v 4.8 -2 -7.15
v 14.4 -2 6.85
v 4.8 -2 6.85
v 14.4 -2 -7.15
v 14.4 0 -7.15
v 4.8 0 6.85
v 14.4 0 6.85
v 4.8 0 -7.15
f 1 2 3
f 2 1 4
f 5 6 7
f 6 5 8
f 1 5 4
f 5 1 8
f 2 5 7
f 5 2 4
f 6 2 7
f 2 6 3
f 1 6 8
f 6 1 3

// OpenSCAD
rotate([90,0,0])
translate([9.6/2,-14/2-0.15,0])
{
	cube([9.6,14,2]);
}
